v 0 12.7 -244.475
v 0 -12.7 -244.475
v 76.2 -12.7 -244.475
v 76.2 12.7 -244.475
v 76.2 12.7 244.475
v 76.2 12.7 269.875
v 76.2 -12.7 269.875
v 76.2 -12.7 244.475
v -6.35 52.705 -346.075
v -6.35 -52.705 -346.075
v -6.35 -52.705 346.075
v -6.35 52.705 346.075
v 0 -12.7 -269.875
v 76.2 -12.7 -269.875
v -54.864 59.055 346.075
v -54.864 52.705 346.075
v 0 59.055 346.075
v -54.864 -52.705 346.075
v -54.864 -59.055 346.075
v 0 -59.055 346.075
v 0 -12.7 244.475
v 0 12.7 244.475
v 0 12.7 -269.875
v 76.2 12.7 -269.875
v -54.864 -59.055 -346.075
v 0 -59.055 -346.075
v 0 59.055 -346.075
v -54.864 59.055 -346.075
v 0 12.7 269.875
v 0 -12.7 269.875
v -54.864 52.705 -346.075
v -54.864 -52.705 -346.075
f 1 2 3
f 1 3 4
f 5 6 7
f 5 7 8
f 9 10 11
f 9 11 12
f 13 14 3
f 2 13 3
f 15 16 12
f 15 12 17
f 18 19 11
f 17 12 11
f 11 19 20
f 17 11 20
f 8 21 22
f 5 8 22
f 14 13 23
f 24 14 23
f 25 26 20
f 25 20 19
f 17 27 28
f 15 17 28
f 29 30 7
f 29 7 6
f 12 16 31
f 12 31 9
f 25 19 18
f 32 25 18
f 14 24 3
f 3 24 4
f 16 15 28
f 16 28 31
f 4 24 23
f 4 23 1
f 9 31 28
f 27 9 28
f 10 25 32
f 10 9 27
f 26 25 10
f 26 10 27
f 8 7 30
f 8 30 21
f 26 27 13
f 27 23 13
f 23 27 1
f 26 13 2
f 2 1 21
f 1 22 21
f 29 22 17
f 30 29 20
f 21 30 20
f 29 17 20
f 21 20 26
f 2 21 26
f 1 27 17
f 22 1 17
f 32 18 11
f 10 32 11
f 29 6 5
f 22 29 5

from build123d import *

# Parameters (mm, degrees)
BOSS_EXTRUDE1_DEPTH = 346.075
SKETCH2_W           = 25.4
SKETCH2_H           = 25.4
BOSS_EXTRUDE2_DEPTH = 76.2


with BuildPart() as part:
    # Sketch1 → Boss-Extrude1 (new body, symmetric)
    with BuildSketch(Plane.XY):
        Polygon((0, 0), (0, 59.055), (-54.864, 59.055), (-54.864, 52.705), (-6.35, 52.705), (-6.35, 0), align=None)
    boss_extrude1 = extrude(amount=BOSS_EXTRUDE1_DEPTH, both=True)

    # Mirror1: Boss-Extrude1 across plane
    add(boss_extrude1.mirror(Plane(origin=(-6.35, 0, 346.075), x_dir=(0, 0, 1), z_dir=(0, 1, 0))))

    # Sketch2 → Boss-Extrude2 (add)
    with BuildSketch(Plane(origin=(0, 0, 0), x_dir=(0, 0, -1), z_dir=(1, 0, 0))):
        with Locations((-257.175, 0)):
            Rectangle(SKETCH2_W, SKETCH2_H)
    boss_extrude2 = extrude(amount=BOSS_EXTRUDE2_DEPTH)

    # Mirror2: Boss-Extrude2 across plane
    add(boss_extrude2.mirror(Plane.XY))


solid = part.part
